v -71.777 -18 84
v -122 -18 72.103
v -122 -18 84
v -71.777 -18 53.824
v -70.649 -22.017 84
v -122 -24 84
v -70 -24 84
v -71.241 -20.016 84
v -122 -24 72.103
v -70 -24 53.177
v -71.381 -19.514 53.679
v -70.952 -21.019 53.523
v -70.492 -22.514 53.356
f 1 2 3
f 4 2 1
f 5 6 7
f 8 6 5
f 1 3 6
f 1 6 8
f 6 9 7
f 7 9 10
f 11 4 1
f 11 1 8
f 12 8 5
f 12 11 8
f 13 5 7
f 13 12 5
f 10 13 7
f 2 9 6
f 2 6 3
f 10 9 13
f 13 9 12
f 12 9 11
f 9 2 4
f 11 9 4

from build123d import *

# Parameters (mm, degrees)
CYLINDER1793_R         = 74
CYLINDER1793_DEPTH     = 60
BOX751_W               = 80
BOX751_H               = 6
BOX751_DEPTH           = 20
BOX751_PLACEMENT_ANGLE = 20
BOX753_W               = 57
BOX753_H               = 6
BOX753_DEPTH           = 32


with BuildPart() as v_lec1793:
    # Cylinder1793 → Cylinder1793 (new body)
    with BuildSketch(Plane.XY.offset(26)):
        Circle(CYLINDER1793_R)
    extrude(amount=CYLINDER1793_DEPTH)


with BuildPart() as krychle751:
    # Box751 → Box751 (new body)
    with BuildSketch(Plane.XY):
        with Locations((40, 3)):
            Rectangle(BOX751_W, BOX751_H)
    extrude(amount=BOX751_DEPTH)


with BuildPart() as krychle751_1:
    # Box751 placement: moved
    add(krychle751.part.moved(Location((-131.7, -24, 54.35))).rotate(Axis((-131.7, -24, 54.35), (0, 1, 0)), BOX751_PLACEMENT_ANGLE))


with BuildPart() as cut554:
    # Box753 → Box753 (new body)
    with BuildSketch(Plane(origin=(-122, -24, 52), x_dir=(1, 0, 0), z_dir=(0, 0, 1))):
        with Locations((28.5, 3)):
            Rectangle(BOX753_W, BOX753_H)
    extrude(amount=BOX753_DEPTH)

    # Cut553: cut Krychle751
    add(krychle751_1.part, mode=Mode.SUBTRACT)

    # Cut554: cut Válec1793
    add(v_lec1793.part, mode=Mode.SUBTRACT)


solid = cut554.part
